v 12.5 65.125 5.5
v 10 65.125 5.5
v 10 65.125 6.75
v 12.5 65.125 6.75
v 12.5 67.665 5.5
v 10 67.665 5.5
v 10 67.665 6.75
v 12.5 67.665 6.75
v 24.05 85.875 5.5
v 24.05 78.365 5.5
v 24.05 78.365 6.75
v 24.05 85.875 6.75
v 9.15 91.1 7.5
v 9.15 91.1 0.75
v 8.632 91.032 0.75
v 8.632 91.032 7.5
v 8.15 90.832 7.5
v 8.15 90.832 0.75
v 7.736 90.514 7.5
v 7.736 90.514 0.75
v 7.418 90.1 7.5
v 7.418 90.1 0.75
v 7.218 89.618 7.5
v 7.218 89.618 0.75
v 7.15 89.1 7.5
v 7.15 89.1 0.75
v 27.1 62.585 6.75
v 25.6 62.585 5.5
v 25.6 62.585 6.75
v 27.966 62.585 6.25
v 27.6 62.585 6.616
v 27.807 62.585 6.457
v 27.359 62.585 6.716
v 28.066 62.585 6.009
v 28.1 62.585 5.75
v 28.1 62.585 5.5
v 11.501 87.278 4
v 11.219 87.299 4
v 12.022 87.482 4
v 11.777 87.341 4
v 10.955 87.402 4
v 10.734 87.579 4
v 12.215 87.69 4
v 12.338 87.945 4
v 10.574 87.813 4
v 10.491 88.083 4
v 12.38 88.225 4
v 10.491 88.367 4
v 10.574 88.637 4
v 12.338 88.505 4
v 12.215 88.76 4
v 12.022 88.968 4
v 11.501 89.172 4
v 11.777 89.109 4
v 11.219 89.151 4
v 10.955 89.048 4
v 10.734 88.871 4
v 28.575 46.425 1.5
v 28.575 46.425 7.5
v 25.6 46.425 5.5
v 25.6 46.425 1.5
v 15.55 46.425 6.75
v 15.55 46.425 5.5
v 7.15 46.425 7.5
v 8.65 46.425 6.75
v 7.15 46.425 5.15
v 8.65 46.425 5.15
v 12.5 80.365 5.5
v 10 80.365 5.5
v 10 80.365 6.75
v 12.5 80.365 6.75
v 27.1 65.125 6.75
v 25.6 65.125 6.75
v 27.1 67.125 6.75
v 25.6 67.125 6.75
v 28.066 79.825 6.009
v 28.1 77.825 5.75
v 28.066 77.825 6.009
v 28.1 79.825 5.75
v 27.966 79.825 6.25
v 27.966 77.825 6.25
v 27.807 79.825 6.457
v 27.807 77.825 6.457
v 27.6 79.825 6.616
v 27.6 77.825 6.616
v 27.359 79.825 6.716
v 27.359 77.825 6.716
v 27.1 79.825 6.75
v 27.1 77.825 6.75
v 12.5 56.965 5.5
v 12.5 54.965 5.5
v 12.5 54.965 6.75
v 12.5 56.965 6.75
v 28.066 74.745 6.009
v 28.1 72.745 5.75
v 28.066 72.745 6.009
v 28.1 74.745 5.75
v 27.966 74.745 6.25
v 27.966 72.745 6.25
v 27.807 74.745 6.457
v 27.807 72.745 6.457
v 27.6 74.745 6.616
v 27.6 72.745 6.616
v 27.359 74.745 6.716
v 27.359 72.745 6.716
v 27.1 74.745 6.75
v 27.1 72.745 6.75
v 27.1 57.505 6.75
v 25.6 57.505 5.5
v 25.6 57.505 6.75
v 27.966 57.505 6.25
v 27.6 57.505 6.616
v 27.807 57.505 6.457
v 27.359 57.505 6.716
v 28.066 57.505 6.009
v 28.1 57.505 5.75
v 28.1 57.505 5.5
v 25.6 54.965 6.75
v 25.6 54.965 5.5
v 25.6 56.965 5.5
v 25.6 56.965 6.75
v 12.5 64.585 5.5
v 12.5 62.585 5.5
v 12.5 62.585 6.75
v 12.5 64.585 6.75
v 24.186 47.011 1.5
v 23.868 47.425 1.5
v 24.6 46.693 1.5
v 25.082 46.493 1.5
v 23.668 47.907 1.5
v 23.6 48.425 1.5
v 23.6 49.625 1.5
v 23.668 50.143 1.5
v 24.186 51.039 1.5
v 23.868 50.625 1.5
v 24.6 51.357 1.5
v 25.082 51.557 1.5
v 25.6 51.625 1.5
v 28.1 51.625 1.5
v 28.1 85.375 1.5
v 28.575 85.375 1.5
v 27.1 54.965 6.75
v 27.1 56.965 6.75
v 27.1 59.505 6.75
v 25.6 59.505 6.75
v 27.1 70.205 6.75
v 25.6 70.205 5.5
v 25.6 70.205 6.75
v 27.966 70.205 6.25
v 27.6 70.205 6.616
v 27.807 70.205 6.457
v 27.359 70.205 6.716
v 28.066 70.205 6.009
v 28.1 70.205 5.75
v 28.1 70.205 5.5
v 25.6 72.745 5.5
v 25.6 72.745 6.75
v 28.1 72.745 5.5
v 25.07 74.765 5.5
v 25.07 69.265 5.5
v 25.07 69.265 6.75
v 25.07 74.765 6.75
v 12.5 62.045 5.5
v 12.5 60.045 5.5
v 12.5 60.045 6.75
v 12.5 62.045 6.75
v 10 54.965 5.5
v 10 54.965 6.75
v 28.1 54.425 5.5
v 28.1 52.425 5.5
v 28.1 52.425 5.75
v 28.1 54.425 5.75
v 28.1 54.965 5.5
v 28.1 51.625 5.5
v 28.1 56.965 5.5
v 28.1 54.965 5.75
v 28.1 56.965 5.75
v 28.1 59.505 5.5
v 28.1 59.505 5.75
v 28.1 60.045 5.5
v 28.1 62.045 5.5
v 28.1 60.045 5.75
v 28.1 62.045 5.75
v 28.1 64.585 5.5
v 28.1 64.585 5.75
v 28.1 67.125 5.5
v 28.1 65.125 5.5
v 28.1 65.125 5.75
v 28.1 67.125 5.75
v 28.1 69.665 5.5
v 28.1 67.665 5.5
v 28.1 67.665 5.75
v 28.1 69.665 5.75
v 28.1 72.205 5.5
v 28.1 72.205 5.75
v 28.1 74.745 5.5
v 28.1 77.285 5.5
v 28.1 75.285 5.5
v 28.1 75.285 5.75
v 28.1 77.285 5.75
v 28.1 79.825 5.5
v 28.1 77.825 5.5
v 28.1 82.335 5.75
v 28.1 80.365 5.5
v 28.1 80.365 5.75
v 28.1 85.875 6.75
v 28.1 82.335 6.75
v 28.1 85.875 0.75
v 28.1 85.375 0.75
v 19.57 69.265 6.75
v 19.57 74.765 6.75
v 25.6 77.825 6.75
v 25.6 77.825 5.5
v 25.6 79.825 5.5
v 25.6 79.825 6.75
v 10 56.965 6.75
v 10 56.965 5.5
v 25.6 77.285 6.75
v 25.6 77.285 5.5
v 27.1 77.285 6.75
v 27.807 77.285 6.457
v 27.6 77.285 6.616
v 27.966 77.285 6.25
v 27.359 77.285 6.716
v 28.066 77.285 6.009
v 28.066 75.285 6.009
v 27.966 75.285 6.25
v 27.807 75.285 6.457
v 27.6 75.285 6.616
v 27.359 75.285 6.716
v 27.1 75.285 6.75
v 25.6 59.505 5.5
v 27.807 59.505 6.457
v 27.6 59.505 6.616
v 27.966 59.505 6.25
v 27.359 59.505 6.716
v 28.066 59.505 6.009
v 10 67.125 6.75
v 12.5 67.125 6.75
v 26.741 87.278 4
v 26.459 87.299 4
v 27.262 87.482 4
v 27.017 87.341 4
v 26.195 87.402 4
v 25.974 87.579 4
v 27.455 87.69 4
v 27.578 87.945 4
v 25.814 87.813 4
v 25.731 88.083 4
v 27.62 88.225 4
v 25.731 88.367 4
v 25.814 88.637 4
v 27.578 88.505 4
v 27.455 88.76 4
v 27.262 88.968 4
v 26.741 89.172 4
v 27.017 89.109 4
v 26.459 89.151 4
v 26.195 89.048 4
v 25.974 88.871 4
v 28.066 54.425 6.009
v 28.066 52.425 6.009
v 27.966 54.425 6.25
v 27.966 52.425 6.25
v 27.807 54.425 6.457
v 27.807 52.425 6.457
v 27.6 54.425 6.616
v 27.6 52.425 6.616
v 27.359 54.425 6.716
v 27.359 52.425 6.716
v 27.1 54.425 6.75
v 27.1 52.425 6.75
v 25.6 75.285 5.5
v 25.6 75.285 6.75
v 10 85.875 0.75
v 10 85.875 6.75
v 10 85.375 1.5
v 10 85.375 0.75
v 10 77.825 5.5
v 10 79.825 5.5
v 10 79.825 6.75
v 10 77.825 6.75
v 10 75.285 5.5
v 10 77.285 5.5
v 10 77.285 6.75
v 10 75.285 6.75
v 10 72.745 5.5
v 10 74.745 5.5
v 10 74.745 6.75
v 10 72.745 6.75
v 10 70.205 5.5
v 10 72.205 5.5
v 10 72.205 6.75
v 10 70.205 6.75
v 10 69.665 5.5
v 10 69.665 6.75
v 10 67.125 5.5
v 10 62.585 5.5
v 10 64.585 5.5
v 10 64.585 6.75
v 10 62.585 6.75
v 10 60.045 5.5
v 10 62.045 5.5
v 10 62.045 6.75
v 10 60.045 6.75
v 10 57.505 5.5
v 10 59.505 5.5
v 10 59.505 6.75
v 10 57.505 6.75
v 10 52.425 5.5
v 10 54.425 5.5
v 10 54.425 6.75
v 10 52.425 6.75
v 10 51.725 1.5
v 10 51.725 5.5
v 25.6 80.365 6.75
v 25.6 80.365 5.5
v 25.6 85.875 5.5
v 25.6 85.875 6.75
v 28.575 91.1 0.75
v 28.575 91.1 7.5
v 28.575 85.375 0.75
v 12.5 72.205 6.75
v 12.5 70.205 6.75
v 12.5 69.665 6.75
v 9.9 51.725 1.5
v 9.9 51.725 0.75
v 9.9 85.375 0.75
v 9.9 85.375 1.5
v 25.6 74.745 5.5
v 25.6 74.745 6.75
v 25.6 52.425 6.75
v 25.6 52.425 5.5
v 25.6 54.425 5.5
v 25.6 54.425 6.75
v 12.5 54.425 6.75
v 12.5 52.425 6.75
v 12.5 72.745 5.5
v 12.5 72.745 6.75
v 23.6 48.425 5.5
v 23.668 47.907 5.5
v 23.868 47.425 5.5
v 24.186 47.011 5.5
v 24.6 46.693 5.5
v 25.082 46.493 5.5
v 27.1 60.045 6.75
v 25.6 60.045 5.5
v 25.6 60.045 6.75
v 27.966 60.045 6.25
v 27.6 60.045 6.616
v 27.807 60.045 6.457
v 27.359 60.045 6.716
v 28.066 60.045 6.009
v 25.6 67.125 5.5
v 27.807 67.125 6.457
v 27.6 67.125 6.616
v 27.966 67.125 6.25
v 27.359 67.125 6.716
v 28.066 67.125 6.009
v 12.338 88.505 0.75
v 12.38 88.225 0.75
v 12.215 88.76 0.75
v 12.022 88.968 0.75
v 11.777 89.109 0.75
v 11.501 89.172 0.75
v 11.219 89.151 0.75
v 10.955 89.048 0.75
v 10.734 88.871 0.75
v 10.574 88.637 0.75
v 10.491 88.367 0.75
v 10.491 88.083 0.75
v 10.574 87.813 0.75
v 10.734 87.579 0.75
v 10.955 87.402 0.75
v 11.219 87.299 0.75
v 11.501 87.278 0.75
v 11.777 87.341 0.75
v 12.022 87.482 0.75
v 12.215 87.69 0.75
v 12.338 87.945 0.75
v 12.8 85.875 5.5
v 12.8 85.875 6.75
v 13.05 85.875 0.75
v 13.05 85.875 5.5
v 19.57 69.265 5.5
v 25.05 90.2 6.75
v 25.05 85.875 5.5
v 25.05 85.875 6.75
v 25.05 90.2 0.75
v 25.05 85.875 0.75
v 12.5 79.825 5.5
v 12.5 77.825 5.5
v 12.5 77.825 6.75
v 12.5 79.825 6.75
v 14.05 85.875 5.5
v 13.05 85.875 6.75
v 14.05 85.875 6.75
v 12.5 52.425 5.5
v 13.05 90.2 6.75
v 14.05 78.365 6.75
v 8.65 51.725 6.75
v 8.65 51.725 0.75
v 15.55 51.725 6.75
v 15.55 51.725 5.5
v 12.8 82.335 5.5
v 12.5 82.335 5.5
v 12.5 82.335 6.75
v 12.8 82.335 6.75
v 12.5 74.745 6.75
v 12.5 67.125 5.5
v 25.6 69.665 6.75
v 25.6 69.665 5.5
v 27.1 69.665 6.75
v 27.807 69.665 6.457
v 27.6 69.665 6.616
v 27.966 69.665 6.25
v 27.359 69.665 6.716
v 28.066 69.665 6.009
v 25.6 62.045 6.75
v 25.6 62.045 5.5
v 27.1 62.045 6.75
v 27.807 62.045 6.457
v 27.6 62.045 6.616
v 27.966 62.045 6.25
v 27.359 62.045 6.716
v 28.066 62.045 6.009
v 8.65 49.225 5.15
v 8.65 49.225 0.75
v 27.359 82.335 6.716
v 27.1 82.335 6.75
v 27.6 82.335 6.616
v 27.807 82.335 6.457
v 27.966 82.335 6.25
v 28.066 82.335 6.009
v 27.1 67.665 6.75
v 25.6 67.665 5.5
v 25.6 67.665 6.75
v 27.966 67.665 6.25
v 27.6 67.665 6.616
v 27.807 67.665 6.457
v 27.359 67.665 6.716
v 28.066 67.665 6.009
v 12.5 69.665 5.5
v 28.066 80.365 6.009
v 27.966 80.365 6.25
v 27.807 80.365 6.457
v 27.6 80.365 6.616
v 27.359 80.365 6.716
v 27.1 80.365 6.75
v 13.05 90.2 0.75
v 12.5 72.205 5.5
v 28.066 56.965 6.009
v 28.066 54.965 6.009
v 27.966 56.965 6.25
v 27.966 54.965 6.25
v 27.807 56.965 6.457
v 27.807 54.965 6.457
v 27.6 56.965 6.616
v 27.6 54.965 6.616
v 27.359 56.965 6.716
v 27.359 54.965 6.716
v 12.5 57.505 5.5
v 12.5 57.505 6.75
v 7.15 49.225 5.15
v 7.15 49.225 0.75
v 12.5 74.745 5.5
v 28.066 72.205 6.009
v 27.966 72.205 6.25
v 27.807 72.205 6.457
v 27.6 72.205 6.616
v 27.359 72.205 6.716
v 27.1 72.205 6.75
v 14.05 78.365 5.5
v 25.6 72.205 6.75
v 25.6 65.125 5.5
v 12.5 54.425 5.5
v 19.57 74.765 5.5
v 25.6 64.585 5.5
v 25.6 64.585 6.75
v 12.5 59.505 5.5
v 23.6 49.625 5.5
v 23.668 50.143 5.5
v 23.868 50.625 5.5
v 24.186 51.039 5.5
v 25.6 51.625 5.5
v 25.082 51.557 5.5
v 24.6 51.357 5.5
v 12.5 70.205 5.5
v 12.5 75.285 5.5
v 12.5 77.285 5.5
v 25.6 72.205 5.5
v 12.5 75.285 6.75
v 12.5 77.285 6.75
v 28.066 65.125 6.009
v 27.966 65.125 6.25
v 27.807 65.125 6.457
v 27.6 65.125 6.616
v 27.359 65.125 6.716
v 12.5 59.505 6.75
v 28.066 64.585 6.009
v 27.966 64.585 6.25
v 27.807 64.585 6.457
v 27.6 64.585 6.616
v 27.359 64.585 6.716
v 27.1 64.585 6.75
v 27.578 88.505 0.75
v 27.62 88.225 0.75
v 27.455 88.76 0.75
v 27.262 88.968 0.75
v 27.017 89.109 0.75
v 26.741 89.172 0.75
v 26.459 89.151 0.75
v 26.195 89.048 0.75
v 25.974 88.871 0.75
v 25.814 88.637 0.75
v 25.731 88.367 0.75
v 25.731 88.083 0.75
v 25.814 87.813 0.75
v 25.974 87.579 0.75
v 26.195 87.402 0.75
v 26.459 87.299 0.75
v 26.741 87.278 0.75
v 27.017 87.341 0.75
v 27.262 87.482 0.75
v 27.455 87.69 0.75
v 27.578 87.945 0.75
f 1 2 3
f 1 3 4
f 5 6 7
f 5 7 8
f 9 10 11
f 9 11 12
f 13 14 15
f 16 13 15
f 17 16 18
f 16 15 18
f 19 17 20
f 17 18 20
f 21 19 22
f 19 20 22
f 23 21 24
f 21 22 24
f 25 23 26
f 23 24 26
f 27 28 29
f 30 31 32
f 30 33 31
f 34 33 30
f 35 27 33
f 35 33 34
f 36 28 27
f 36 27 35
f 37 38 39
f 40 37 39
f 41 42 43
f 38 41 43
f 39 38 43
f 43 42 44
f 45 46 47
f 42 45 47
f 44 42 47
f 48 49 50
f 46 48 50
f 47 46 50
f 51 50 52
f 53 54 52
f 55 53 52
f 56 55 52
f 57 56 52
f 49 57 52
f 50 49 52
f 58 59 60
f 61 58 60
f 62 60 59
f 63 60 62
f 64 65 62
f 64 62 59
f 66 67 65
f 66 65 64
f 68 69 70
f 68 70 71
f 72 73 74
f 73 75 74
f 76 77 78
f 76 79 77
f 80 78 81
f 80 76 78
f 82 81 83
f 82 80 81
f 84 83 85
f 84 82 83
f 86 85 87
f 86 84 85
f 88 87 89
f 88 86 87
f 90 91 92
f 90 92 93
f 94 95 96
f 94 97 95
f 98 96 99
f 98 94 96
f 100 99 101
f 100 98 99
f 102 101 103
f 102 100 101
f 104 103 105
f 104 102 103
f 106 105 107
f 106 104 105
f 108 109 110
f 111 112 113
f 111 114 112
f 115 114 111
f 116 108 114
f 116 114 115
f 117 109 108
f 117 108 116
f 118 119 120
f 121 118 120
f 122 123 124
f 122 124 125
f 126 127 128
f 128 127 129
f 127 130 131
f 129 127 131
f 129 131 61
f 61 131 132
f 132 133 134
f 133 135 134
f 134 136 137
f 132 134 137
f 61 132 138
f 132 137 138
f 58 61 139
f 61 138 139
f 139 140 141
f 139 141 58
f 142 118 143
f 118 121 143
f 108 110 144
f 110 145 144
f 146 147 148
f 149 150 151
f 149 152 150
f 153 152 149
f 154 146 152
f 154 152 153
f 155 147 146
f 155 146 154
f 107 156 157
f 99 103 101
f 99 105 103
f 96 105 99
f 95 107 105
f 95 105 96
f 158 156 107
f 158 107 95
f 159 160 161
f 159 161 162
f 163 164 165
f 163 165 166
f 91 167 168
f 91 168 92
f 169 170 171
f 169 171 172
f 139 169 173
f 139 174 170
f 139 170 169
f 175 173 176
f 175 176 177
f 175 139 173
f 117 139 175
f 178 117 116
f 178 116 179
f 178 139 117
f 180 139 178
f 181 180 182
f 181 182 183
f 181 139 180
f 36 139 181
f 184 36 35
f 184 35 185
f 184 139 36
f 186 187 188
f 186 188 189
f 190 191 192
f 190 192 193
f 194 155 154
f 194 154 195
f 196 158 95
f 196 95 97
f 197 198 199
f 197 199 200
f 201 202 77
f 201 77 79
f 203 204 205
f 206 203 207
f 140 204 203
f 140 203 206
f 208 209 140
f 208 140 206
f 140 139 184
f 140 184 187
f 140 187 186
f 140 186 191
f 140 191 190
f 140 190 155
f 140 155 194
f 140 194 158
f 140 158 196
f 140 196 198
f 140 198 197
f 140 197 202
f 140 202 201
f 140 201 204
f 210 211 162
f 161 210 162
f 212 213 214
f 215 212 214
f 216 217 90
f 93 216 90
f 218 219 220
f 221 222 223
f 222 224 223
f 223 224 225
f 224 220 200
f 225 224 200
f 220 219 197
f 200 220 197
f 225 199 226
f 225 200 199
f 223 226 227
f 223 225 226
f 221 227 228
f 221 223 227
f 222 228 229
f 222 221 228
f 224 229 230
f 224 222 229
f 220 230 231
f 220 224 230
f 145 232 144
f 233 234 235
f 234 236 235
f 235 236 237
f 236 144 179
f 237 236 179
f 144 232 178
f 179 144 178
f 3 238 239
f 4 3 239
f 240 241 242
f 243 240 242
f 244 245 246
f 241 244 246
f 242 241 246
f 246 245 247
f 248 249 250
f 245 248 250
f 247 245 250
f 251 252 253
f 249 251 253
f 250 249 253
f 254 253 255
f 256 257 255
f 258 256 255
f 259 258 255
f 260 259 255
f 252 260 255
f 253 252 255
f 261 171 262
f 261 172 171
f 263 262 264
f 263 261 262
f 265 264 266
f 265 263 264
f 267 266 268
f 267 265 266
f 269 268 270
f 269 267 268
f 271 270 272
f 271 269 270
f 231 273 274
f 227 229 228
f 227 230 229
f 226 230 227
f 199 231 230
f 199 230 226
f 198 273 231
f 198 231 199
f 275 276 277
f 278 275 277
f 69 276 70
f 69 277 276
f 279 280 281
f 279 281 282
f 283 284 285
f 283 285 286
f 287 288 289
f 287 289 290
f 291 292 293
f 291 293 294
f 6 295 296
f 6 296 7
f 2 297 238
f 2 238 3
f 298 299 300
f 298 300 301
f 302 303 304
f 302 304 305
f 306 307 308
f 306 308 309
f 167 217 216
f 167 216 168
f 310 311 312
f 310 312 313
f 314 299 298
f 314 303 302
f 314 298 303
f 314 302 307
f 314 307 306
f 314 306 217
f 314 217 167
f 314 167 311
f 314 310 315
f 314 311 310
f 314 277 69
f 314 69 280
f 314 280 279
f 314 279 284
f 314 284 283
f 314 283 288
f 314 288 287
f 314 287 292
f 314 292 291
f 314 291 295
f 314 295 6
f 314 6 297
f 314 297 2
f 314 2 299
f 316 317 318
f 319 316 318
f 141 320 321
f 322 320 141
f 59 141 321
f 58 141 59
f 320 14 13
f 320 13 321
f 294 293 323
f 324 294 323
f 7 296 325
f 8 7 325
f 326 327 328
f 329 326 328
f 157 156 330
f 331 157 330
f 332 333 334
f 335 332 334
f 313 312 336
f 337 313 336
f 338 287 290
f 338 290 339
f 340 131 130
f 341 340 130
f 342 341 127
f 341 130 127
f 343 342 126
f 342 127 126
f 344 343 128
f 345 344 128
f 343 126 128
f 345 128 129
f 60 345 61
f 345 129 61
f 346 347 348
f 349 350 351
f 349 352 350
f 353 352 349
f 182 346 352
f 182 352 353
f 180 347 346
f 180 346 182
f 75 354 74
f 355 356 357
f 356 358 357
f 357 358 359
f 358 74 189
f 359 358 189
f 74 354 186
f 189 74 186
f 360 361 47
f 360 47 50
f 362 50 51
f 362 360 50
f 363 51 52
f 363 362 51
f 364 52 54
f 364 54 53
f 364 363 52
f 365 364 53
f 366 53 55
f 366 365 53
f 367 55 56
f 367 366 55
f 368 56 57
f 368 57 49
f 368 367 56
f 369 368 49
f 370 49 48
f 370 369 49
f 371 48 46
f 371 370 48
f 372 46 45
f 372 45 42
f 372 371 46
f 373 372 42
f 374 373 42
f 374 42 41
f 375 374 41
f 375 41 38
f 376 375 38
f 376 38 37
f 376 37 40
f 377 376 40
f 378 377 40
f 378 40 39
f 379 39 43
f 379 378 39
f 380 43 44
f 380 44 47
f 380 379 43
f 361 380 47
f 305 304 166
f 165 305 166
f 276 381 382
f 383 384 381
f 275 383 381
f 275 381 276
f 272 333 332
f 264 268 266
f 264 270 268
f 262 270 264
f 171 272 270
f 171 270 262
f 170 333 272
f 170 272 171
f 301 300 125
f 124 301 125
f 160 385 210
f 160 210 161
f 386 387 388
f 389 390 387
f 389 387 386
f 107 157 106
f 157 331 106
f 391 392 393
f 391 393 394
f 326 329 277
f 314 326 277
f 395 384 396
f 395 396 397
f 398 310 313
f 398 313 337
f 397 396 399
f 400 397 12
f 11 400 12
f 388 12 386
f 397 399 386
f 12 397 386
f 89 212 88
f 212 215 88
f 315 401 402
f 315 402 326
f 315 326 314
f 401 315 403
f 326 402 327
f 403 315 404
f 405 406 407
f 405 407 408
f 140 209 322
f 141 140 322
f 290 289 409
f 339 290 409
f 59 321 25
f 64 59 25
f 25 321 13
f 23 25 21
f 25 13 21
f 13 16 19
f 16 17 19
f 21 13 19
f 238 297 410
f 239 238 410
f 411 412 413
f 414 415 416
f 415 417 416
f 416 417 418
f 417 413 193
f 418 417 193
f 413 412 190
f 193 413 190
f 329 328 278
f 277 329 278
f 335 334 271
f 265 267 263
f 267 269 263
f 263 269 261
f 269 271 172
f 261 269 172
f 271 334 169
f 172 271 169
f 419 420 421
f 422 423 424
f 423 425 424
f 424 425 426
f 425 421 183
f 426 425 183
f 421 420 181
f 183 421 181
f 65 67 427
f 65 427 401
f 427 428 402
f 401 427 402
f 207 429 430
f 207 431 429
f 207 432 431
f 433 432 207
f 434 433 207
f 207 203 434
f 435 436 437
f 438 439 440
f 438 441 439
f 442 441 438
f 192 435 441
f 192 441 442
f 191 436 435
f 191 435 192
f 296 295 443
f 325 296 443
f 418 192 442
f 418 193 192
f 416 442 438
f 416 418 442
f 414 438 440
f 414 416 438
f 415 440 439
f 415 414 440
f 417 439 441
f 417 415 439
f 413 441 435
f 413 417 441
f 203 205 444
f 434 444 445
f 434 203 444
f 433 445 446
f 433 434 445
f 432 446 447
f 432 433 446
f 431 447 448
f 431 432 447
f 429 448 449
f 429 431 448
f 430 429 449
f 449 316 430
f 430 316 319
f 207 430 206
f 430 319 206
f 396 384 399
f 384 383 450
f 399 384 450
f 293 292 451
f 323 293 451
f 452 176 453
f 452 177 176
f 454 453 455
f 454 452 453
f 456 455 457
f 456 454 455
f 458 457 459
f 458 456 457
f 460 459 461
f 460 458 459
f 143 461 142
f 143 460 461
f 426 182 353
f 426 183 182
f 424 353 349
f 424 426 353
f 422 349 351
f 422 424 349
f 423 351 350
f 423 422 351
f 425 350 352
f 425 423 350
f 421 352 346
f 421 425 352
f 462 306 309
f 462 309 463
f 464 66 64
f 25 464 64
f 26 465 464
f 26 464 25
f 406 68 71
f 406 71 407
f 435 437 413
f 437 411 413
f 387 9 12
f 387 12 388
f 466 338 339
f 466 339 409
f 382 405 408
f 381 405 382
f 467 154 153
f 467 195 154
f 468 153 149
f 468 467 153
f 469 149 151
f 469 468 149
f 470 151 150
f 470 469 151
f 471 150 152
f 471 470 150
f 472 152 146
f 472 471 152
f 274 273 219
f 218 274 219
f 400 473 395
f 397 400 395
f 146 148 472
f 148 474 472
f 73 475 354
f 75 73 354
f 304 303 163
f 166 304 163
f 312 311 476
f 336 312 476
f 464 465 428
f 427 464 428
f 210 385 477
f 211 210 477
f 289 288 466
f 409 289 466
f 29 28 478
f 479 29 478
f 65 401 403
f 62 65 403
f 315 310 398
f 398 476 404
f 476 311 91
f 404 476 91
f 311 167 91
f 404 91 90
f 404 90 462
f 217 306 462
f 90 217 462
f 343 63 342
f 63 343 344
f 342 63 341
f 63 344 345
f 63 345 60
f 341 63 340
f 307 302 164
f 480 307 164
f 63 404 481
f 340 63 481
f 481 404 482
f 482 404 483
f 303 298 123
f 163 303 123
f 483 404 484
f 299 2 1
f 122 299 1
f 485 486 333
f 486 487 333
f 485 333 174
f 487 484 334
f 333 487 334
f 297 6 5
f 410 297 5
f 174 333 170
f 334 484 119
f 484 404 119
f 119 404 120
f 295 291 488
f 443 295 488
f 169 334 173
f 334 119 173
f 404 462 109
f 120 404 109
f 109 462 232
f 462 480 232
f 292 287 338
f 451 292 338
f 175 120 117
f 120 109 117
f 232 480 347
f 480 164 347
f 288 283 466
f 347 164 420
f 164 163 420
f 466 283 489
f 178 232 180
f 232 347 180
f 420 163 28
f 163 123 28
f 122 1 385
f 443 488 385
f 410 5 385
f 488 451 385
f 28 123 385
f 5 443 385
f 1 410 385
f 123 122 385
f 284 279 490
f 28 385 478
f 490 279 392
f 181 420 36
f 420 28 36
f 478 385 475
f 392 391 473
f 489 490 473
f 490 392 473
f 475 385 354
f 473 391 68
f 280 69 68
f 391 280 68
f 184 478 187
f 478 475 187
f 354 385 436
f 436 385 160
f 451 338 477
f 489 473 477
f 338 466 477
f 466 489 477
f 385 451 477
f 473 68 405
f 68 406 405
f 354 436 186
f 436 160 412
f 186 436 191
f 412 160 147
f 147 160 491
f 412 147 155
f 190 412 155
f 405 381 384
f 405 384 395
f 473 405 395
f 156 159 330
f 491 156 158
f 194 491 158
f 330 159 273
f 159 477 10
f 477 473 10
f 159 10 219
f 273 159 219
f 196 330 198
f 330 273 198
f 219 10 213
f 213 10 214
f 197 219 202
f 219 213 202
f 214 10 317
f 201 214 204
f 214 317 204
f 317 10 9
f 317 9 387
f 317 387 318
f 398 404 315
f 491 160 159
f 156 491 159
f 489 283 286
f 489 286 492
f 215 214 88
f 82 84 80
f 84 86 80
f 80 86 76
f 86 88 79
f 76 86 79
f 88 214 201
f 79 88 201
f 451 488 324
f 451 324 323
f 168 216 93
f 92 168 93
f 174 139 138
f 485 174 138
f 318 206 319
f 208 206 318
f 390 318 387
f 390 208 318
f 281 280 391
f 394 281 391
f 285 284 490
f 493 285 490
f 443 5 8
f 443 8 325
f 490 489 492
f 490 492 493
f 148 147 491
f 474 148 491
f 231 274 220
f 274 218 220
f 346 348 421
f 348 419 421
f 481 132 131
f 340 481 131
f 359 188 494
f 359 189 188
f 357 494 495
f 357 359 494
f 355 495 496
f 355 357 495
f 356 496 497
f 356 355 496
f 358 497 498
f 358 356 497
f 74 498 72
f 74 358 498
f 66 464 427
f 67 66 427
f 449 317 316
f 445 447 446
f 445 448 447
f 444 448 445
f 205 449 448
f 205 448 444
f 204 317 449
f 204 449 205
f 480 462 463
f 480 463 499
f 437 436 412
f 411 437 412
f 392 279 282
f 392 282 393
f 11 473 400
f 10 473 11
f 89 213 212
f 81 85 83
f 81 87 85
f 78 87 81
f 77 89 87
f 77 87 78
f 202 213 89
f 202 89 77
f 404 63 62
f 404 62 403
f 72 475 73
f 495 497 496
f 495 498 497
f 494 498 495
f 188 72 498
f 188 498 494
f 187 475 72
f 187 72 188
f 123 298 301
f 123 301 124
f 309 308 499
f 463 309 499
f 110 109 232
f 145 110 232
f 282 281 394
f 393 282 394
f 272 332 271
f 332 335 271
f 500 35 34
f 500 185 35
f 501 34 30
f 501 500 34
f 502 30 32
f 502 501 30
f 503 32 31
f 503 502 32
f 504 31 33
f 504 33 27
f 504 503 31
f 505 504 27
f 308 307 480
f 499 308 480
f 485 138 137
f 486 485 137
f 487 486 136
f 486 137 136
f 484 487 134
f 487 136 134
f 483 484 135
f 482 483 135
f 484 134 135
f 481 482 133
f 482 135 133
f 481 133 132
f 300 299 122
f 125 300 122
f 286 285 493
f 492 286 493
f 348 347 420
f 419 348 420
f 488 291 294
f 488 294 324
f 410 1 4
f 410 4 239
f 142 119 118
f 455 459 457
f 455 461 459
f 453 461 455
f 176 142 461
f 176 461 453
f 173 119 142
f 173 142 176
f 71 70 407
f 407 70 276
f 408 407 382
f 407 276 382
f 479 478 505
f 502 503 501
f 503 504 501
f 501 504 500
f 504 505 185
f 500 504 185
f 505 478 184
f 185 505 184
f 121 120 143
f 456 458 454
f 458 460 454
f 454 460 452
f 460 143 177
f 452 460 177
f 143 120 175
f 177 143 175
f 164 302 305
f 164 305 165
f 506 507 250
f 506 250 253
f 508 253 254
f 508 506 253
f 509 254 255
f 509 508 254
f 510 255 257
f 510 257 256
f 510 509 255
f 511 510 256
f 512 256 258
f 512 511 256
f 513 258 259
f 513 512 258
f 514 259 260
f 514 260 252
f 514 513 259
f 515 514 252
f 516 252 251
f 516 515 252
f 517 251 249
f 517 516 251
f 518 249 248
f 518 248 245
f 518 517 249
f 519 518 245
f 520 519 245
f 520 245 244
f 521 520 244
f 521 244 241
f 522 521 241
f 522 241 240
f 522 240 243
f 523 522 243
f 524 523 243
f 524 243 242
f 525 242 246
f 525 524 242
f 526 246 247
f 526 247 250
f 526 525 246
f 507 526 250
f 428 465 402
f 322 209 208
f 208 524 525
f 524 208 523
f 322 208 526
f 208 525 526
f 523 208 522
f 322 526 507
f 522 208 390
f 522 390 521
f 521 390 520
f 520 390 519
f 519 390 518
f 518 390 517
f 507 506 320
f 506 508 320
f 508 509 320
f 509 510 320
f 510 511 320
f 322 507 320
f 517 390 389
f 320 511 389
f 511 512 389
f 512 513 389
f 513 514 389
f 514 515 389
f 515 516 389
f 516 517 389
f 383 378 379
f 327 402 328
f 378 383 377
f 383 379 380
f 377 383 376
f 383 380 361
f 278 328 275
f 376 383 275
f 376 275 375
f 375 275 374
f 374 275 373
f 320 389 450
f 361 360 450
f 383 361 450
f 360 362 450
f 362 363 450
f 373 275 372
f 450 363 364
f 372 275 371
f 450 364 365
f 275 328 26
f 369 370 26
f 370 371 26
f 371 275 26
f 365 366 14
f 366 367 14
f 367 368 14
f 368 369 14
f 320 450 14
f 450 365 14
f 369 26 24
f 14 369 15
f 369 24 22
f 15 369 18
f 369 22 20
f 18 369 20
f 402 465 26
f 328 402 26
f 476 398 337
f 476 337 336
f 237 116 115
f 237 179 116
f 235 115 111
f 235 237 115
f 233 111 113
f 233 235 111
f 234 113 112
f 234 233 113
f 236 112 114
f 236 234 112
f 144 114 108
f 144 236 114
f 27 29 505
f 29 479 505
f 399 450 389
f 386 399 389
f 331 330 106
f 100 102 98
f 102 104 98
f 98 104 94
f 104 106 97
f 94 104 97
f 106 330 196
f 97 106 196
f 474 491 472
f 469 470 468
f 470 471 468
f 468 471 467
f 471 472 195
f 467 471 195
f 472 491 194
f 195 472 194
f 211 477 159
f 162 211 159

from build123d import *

# Parameters (mm, degrees)
PAD018_DEPTH    = 7.5
POCKET031_DEPTH = 5.5
SKETCH104_W     = 12
SKETCH104_H     = 4.325
POCKET070_DEPTH = 6.75
SKETCH054_W     = 50
SKETCH054_H     = 50
POCKET030_DEPTH = 1.5
SKETCH060_W     = 10
SKETCH060_H     = 8
SKETCH060_W_2   = 5.5
SKETCH060_H_2   = 5.5
SKETCH060_W_3   = 6.9
SKETCH060_H_3   = 9
SKETCH060_W_4   = 2.5
SKETCH060_H_4   = 2
POCKET034_DEPTH = 6.75
FILLET007_R     = 1
SKETCH087_W     = 2.8
SKETCH087_H     = 3.54
SKETCH087_W_2   = 2.5
POCKET058_DEPTH = 6.75
SKETCH084_W     = 1.5
SKETCH084_H     = 4.6
POCKET055_DEPTH = 5.15
SKETCH091_W     = 43.475
SKETCH091_H     = 0.75
POCKET060_DEPTH = 28.576
SKETCH093_W     = 37.75
SKETCH093_H     = 0.75
POCKET062_DEPTH = 9.526
SKETCH067_R     = 0.95
POCKET044_DEPTH = 3.25


with BuildPart() as part:
    # Sketch053 → Pad018 (new body)
    with BuildSketch(Plane.XY):
        with BuildLine():
            Line((28.575, 91.1), (28.575, 46.425))
            Line((28.575, 46.425), (7.15, 46.425))
            Line((7.15, 46.425), (7.15, 89.1))
            ThreePointArc((9.15, 91.1), (7.735786, 90.514214), (7.15, 89.1))
            Line((9.15, 91.1), (28.575, 91.1))
        make_face()
    extrude(amount=PAD018_DEPTH)

    # Sketch055 → Pocket031 (cut)
    with BuildSketch(Plane.XY):
        with BuildLine():
            Line((28.1, 51.625), (28.1, 85.875))
            Line((28.1, 85.875), (10, 85.875))
            Line((10, 85.875), (10, 46.425))
            Line((10, 46.425), (25.6, 46.425))
            ThreePointArc((23.6, 48.425), (24.185786, 47.010786), (25.6, 46.425))
            Line((23.6, 49.625), (23.6, 48.425))
            ThreePointArc((25.6, 51.625), (24.185786, 51.039214), (23.6, 49.625))
            Line((28.1, 51.625), (25.6, 51.625))
        make_face()
    extrude(amount=POCKET031_DEPTH, mode=Mode.SUBTRACT)

    # Sketch104 → Pocket070 (cut)
    with BuildSketch(Plane.XY):
        with Locations((19.05, 88.0375)):
            Rectangle(SKETCH104_W, SKETCH104_H)
    extrude(amount=POCKET070_DEPTH, mode=Mode.SUBTRACT)

    # Sketch054 → Pocket030 (cut)
    with BuildSketch(Plane.XY):
        with Locations((34.9, 60.375)):
            Rectangle(SKETCH054_W, SKETCH054_H)
    extrude(amount=POCKET030_DEPTH, mode=Mode.SUBTRACT)

    # Sketch060 → Pocket034 (cut)
    with BuildSketch(Plane.XY):
        with Locations((19.05, 82.365)):
            Rectangle(SKETCH060_W, SKETCH060_H)
        with Locations((22.32, 72.015)):
            Rectangle(SKETCH060_W_2, SKETCH060_H_2)
        with Locations((12.1, 47.225)):
            Rectangle(SKETCH060_W_3, SKETCH060_H_3)
        with Locations((26.85, 78.825)):
            Rectangle(SKETCH060_W_4, SKETCH060_H_4)
        with Locations((26.85, 76.285)):
            Rectangle(SKETCH060_W_4, SKETCH060_H_4)
        with Locations((26.85, 73.745)):
            Rectangle(SKETCH060_W_4, SKETCH060_H_4)
        with Locations((26.85, 71.205)):
            Rectangle(SKETCH060_W_4, SKETCH060_H_4)
        with Locations((26.85, 68.665)):
            Rectangle(SKETCH060_W_4, SKETCH060_H_4)
        with Locations((26.85, 66.125)):
            Rectangle(SKETCH060_W_4, SKETCH060_H_4)
        with Locations((26.85, 63.585)):
            Rectangle(SKETCH060_W_4, SKETCH060_H_4)
        with Locations((26.85, 81.365)):
            Rectangle(SKETCH060_W_4, SKETCH060_H_4)
        with Locations((26.85, 61.045)):
            Rectangle(SKETCH060_W_4, SKETCH060_H_4)
        with Locations((26.85, 58.505)):
            Rectangle(SKETCH060_W_4, SKETCH060_H_4)
        with Locations((26.85, 55.965)):
            Rectangle(SKETCH060_W_4, SKETCH060_H_4)
        with Locations((26.85, 53.425)):
            Rectangle(SKETCH060_W_4, SKETCH060_H_4)
        with Locations((11.25, 78.825)):
            Rectangle(SKETCH060_W_4, SKETCH060_H_4)
        with Locations((11.25, 76.285)):
            Rectangle(SKETCH060_W_4, SKETCH060_H_4)
        with Locations((11.25, 73.745)):
            Rectangle(SKETCH060_W_4, SKETCH060_H_4)
        with Locations((11.25, 71.205)):
            Rectangle(SKETCH060_W_4, SKETCH060_H_4)
        with Locations((11.25, 68.665)):
            Rectangle(SKETCH060_W_4, SKETCH060_H_4)
        with Locations((11.25, 66.125)):
            Rectangle(SKETCH060_W_4, SKETCH060_H_4)
        with Locations((11.25, 63.585)):
            Rectangle(SKETCH060_W_4, SKETCH060_H_4)
        with Locations((11.25, 61.045)):
            Rectangle(SKETCH060_W_4, SKETCH060_H_4)
        with Locations((11.25, 58.505)):
            Rectangle(SKETCH060_W_4, SKETCH060_H_4)
        with Locations((11.25, 55.965)):
            Rectangle(SKETCH060_W_4, SKETCH060_H_4)
        with Locations((11.25, 53.425)):
            Rectangle(SKETCH060_W_4, SKETCH060_H_4)
        with Locations((11.25, 81.365)):
            Rectangle(SKETCH060_W_4, SKETCH060_H_4)
    extrude(amount=POCKET034_DEPTH, mode=Mode.SUBTRACT)

    # Fillet007
    fillet007_edges = [part.edges().sort_by_distance(p)[0] for p in [
        (28.1, 53.425, 6.75),
        (28.1, 55.965, 6.75),
        (28.1, 58.505, 6.75),
        (28.1, 61.045, 6.75),
        (28.1, 63.585, 6.75),
        (28.1, 66.125, 6.75),
        (28.1, 68.665, 6.75),
        (28.1, 71.205, 6.75),
        (28.1, 73.745, 6.75),
        (28.1, 76.285, 6.75),
        (28.1, 78.825, 6.75),
        (28.1, 81.365, 6.75),
    ]]
    fillet(fillet007_edges, radius=FILLET007_R)

    # Sketch087 → Pocket058 (cut)
    with BuildSketch(Plane.XY):
        with Locations((11.4, 84.105)):
            Rectangle(SKETCH087_W, SKETCH087_H)
        with Locations((26.85, 84.105)):
            Rectangle(SKETCH087_W_2, SKETCH087_H)
    extrude(amount=POCKET058_DEPTH, mode=Mode.SUBTRACT)

    # Sketch084 → Pocket055 (cut)
    with BuildSketch(Plane.XY):
        with Locations((7.9, 46.925)):
            Rectangle(SKETCH084_W, SKETCH084_H)
    extrude(amount=POCKET055_DEPTH, mode=Mode.SUBTRACT)

    # Sketch091 → Pocket060 (cut, through all)
    with BuildSketch(Plane.YZ):
        with Locations((69.3625, 0.375)):
            Rectangle(SKETCH091_W, SKETCH091_H)
    extrude(amount=POCKET060_DEPTH, mode=Mode.SUBTRACT)

    # Sketch093 → Pocket062 (cut, through all)
    with BuildSketch(Plane.YZ.offset(19.05)):
        with Locations((66.5, 1.125)):
            Rectangle(SKETCH093_W, SKETCH093_H)
    extrude(amount=POCKET062_DEPTH, mode=Mode.SUBTRACT)

    # Sketch067 (on Face9 of Pocket062) → Pocket044 (cut)
    with BuildSketch(Plane.XY.offset(0.75)):
        with Locations((26.67, 88.225)):
            Circle(SKETCH067_R)
        with Locations((11.43, 88.225)):
            Circle(SKETCH067_R)
    extrude(amount=POCKET044_DEPTH, mode=Mode.SUBTRACT)


solid = part.part
